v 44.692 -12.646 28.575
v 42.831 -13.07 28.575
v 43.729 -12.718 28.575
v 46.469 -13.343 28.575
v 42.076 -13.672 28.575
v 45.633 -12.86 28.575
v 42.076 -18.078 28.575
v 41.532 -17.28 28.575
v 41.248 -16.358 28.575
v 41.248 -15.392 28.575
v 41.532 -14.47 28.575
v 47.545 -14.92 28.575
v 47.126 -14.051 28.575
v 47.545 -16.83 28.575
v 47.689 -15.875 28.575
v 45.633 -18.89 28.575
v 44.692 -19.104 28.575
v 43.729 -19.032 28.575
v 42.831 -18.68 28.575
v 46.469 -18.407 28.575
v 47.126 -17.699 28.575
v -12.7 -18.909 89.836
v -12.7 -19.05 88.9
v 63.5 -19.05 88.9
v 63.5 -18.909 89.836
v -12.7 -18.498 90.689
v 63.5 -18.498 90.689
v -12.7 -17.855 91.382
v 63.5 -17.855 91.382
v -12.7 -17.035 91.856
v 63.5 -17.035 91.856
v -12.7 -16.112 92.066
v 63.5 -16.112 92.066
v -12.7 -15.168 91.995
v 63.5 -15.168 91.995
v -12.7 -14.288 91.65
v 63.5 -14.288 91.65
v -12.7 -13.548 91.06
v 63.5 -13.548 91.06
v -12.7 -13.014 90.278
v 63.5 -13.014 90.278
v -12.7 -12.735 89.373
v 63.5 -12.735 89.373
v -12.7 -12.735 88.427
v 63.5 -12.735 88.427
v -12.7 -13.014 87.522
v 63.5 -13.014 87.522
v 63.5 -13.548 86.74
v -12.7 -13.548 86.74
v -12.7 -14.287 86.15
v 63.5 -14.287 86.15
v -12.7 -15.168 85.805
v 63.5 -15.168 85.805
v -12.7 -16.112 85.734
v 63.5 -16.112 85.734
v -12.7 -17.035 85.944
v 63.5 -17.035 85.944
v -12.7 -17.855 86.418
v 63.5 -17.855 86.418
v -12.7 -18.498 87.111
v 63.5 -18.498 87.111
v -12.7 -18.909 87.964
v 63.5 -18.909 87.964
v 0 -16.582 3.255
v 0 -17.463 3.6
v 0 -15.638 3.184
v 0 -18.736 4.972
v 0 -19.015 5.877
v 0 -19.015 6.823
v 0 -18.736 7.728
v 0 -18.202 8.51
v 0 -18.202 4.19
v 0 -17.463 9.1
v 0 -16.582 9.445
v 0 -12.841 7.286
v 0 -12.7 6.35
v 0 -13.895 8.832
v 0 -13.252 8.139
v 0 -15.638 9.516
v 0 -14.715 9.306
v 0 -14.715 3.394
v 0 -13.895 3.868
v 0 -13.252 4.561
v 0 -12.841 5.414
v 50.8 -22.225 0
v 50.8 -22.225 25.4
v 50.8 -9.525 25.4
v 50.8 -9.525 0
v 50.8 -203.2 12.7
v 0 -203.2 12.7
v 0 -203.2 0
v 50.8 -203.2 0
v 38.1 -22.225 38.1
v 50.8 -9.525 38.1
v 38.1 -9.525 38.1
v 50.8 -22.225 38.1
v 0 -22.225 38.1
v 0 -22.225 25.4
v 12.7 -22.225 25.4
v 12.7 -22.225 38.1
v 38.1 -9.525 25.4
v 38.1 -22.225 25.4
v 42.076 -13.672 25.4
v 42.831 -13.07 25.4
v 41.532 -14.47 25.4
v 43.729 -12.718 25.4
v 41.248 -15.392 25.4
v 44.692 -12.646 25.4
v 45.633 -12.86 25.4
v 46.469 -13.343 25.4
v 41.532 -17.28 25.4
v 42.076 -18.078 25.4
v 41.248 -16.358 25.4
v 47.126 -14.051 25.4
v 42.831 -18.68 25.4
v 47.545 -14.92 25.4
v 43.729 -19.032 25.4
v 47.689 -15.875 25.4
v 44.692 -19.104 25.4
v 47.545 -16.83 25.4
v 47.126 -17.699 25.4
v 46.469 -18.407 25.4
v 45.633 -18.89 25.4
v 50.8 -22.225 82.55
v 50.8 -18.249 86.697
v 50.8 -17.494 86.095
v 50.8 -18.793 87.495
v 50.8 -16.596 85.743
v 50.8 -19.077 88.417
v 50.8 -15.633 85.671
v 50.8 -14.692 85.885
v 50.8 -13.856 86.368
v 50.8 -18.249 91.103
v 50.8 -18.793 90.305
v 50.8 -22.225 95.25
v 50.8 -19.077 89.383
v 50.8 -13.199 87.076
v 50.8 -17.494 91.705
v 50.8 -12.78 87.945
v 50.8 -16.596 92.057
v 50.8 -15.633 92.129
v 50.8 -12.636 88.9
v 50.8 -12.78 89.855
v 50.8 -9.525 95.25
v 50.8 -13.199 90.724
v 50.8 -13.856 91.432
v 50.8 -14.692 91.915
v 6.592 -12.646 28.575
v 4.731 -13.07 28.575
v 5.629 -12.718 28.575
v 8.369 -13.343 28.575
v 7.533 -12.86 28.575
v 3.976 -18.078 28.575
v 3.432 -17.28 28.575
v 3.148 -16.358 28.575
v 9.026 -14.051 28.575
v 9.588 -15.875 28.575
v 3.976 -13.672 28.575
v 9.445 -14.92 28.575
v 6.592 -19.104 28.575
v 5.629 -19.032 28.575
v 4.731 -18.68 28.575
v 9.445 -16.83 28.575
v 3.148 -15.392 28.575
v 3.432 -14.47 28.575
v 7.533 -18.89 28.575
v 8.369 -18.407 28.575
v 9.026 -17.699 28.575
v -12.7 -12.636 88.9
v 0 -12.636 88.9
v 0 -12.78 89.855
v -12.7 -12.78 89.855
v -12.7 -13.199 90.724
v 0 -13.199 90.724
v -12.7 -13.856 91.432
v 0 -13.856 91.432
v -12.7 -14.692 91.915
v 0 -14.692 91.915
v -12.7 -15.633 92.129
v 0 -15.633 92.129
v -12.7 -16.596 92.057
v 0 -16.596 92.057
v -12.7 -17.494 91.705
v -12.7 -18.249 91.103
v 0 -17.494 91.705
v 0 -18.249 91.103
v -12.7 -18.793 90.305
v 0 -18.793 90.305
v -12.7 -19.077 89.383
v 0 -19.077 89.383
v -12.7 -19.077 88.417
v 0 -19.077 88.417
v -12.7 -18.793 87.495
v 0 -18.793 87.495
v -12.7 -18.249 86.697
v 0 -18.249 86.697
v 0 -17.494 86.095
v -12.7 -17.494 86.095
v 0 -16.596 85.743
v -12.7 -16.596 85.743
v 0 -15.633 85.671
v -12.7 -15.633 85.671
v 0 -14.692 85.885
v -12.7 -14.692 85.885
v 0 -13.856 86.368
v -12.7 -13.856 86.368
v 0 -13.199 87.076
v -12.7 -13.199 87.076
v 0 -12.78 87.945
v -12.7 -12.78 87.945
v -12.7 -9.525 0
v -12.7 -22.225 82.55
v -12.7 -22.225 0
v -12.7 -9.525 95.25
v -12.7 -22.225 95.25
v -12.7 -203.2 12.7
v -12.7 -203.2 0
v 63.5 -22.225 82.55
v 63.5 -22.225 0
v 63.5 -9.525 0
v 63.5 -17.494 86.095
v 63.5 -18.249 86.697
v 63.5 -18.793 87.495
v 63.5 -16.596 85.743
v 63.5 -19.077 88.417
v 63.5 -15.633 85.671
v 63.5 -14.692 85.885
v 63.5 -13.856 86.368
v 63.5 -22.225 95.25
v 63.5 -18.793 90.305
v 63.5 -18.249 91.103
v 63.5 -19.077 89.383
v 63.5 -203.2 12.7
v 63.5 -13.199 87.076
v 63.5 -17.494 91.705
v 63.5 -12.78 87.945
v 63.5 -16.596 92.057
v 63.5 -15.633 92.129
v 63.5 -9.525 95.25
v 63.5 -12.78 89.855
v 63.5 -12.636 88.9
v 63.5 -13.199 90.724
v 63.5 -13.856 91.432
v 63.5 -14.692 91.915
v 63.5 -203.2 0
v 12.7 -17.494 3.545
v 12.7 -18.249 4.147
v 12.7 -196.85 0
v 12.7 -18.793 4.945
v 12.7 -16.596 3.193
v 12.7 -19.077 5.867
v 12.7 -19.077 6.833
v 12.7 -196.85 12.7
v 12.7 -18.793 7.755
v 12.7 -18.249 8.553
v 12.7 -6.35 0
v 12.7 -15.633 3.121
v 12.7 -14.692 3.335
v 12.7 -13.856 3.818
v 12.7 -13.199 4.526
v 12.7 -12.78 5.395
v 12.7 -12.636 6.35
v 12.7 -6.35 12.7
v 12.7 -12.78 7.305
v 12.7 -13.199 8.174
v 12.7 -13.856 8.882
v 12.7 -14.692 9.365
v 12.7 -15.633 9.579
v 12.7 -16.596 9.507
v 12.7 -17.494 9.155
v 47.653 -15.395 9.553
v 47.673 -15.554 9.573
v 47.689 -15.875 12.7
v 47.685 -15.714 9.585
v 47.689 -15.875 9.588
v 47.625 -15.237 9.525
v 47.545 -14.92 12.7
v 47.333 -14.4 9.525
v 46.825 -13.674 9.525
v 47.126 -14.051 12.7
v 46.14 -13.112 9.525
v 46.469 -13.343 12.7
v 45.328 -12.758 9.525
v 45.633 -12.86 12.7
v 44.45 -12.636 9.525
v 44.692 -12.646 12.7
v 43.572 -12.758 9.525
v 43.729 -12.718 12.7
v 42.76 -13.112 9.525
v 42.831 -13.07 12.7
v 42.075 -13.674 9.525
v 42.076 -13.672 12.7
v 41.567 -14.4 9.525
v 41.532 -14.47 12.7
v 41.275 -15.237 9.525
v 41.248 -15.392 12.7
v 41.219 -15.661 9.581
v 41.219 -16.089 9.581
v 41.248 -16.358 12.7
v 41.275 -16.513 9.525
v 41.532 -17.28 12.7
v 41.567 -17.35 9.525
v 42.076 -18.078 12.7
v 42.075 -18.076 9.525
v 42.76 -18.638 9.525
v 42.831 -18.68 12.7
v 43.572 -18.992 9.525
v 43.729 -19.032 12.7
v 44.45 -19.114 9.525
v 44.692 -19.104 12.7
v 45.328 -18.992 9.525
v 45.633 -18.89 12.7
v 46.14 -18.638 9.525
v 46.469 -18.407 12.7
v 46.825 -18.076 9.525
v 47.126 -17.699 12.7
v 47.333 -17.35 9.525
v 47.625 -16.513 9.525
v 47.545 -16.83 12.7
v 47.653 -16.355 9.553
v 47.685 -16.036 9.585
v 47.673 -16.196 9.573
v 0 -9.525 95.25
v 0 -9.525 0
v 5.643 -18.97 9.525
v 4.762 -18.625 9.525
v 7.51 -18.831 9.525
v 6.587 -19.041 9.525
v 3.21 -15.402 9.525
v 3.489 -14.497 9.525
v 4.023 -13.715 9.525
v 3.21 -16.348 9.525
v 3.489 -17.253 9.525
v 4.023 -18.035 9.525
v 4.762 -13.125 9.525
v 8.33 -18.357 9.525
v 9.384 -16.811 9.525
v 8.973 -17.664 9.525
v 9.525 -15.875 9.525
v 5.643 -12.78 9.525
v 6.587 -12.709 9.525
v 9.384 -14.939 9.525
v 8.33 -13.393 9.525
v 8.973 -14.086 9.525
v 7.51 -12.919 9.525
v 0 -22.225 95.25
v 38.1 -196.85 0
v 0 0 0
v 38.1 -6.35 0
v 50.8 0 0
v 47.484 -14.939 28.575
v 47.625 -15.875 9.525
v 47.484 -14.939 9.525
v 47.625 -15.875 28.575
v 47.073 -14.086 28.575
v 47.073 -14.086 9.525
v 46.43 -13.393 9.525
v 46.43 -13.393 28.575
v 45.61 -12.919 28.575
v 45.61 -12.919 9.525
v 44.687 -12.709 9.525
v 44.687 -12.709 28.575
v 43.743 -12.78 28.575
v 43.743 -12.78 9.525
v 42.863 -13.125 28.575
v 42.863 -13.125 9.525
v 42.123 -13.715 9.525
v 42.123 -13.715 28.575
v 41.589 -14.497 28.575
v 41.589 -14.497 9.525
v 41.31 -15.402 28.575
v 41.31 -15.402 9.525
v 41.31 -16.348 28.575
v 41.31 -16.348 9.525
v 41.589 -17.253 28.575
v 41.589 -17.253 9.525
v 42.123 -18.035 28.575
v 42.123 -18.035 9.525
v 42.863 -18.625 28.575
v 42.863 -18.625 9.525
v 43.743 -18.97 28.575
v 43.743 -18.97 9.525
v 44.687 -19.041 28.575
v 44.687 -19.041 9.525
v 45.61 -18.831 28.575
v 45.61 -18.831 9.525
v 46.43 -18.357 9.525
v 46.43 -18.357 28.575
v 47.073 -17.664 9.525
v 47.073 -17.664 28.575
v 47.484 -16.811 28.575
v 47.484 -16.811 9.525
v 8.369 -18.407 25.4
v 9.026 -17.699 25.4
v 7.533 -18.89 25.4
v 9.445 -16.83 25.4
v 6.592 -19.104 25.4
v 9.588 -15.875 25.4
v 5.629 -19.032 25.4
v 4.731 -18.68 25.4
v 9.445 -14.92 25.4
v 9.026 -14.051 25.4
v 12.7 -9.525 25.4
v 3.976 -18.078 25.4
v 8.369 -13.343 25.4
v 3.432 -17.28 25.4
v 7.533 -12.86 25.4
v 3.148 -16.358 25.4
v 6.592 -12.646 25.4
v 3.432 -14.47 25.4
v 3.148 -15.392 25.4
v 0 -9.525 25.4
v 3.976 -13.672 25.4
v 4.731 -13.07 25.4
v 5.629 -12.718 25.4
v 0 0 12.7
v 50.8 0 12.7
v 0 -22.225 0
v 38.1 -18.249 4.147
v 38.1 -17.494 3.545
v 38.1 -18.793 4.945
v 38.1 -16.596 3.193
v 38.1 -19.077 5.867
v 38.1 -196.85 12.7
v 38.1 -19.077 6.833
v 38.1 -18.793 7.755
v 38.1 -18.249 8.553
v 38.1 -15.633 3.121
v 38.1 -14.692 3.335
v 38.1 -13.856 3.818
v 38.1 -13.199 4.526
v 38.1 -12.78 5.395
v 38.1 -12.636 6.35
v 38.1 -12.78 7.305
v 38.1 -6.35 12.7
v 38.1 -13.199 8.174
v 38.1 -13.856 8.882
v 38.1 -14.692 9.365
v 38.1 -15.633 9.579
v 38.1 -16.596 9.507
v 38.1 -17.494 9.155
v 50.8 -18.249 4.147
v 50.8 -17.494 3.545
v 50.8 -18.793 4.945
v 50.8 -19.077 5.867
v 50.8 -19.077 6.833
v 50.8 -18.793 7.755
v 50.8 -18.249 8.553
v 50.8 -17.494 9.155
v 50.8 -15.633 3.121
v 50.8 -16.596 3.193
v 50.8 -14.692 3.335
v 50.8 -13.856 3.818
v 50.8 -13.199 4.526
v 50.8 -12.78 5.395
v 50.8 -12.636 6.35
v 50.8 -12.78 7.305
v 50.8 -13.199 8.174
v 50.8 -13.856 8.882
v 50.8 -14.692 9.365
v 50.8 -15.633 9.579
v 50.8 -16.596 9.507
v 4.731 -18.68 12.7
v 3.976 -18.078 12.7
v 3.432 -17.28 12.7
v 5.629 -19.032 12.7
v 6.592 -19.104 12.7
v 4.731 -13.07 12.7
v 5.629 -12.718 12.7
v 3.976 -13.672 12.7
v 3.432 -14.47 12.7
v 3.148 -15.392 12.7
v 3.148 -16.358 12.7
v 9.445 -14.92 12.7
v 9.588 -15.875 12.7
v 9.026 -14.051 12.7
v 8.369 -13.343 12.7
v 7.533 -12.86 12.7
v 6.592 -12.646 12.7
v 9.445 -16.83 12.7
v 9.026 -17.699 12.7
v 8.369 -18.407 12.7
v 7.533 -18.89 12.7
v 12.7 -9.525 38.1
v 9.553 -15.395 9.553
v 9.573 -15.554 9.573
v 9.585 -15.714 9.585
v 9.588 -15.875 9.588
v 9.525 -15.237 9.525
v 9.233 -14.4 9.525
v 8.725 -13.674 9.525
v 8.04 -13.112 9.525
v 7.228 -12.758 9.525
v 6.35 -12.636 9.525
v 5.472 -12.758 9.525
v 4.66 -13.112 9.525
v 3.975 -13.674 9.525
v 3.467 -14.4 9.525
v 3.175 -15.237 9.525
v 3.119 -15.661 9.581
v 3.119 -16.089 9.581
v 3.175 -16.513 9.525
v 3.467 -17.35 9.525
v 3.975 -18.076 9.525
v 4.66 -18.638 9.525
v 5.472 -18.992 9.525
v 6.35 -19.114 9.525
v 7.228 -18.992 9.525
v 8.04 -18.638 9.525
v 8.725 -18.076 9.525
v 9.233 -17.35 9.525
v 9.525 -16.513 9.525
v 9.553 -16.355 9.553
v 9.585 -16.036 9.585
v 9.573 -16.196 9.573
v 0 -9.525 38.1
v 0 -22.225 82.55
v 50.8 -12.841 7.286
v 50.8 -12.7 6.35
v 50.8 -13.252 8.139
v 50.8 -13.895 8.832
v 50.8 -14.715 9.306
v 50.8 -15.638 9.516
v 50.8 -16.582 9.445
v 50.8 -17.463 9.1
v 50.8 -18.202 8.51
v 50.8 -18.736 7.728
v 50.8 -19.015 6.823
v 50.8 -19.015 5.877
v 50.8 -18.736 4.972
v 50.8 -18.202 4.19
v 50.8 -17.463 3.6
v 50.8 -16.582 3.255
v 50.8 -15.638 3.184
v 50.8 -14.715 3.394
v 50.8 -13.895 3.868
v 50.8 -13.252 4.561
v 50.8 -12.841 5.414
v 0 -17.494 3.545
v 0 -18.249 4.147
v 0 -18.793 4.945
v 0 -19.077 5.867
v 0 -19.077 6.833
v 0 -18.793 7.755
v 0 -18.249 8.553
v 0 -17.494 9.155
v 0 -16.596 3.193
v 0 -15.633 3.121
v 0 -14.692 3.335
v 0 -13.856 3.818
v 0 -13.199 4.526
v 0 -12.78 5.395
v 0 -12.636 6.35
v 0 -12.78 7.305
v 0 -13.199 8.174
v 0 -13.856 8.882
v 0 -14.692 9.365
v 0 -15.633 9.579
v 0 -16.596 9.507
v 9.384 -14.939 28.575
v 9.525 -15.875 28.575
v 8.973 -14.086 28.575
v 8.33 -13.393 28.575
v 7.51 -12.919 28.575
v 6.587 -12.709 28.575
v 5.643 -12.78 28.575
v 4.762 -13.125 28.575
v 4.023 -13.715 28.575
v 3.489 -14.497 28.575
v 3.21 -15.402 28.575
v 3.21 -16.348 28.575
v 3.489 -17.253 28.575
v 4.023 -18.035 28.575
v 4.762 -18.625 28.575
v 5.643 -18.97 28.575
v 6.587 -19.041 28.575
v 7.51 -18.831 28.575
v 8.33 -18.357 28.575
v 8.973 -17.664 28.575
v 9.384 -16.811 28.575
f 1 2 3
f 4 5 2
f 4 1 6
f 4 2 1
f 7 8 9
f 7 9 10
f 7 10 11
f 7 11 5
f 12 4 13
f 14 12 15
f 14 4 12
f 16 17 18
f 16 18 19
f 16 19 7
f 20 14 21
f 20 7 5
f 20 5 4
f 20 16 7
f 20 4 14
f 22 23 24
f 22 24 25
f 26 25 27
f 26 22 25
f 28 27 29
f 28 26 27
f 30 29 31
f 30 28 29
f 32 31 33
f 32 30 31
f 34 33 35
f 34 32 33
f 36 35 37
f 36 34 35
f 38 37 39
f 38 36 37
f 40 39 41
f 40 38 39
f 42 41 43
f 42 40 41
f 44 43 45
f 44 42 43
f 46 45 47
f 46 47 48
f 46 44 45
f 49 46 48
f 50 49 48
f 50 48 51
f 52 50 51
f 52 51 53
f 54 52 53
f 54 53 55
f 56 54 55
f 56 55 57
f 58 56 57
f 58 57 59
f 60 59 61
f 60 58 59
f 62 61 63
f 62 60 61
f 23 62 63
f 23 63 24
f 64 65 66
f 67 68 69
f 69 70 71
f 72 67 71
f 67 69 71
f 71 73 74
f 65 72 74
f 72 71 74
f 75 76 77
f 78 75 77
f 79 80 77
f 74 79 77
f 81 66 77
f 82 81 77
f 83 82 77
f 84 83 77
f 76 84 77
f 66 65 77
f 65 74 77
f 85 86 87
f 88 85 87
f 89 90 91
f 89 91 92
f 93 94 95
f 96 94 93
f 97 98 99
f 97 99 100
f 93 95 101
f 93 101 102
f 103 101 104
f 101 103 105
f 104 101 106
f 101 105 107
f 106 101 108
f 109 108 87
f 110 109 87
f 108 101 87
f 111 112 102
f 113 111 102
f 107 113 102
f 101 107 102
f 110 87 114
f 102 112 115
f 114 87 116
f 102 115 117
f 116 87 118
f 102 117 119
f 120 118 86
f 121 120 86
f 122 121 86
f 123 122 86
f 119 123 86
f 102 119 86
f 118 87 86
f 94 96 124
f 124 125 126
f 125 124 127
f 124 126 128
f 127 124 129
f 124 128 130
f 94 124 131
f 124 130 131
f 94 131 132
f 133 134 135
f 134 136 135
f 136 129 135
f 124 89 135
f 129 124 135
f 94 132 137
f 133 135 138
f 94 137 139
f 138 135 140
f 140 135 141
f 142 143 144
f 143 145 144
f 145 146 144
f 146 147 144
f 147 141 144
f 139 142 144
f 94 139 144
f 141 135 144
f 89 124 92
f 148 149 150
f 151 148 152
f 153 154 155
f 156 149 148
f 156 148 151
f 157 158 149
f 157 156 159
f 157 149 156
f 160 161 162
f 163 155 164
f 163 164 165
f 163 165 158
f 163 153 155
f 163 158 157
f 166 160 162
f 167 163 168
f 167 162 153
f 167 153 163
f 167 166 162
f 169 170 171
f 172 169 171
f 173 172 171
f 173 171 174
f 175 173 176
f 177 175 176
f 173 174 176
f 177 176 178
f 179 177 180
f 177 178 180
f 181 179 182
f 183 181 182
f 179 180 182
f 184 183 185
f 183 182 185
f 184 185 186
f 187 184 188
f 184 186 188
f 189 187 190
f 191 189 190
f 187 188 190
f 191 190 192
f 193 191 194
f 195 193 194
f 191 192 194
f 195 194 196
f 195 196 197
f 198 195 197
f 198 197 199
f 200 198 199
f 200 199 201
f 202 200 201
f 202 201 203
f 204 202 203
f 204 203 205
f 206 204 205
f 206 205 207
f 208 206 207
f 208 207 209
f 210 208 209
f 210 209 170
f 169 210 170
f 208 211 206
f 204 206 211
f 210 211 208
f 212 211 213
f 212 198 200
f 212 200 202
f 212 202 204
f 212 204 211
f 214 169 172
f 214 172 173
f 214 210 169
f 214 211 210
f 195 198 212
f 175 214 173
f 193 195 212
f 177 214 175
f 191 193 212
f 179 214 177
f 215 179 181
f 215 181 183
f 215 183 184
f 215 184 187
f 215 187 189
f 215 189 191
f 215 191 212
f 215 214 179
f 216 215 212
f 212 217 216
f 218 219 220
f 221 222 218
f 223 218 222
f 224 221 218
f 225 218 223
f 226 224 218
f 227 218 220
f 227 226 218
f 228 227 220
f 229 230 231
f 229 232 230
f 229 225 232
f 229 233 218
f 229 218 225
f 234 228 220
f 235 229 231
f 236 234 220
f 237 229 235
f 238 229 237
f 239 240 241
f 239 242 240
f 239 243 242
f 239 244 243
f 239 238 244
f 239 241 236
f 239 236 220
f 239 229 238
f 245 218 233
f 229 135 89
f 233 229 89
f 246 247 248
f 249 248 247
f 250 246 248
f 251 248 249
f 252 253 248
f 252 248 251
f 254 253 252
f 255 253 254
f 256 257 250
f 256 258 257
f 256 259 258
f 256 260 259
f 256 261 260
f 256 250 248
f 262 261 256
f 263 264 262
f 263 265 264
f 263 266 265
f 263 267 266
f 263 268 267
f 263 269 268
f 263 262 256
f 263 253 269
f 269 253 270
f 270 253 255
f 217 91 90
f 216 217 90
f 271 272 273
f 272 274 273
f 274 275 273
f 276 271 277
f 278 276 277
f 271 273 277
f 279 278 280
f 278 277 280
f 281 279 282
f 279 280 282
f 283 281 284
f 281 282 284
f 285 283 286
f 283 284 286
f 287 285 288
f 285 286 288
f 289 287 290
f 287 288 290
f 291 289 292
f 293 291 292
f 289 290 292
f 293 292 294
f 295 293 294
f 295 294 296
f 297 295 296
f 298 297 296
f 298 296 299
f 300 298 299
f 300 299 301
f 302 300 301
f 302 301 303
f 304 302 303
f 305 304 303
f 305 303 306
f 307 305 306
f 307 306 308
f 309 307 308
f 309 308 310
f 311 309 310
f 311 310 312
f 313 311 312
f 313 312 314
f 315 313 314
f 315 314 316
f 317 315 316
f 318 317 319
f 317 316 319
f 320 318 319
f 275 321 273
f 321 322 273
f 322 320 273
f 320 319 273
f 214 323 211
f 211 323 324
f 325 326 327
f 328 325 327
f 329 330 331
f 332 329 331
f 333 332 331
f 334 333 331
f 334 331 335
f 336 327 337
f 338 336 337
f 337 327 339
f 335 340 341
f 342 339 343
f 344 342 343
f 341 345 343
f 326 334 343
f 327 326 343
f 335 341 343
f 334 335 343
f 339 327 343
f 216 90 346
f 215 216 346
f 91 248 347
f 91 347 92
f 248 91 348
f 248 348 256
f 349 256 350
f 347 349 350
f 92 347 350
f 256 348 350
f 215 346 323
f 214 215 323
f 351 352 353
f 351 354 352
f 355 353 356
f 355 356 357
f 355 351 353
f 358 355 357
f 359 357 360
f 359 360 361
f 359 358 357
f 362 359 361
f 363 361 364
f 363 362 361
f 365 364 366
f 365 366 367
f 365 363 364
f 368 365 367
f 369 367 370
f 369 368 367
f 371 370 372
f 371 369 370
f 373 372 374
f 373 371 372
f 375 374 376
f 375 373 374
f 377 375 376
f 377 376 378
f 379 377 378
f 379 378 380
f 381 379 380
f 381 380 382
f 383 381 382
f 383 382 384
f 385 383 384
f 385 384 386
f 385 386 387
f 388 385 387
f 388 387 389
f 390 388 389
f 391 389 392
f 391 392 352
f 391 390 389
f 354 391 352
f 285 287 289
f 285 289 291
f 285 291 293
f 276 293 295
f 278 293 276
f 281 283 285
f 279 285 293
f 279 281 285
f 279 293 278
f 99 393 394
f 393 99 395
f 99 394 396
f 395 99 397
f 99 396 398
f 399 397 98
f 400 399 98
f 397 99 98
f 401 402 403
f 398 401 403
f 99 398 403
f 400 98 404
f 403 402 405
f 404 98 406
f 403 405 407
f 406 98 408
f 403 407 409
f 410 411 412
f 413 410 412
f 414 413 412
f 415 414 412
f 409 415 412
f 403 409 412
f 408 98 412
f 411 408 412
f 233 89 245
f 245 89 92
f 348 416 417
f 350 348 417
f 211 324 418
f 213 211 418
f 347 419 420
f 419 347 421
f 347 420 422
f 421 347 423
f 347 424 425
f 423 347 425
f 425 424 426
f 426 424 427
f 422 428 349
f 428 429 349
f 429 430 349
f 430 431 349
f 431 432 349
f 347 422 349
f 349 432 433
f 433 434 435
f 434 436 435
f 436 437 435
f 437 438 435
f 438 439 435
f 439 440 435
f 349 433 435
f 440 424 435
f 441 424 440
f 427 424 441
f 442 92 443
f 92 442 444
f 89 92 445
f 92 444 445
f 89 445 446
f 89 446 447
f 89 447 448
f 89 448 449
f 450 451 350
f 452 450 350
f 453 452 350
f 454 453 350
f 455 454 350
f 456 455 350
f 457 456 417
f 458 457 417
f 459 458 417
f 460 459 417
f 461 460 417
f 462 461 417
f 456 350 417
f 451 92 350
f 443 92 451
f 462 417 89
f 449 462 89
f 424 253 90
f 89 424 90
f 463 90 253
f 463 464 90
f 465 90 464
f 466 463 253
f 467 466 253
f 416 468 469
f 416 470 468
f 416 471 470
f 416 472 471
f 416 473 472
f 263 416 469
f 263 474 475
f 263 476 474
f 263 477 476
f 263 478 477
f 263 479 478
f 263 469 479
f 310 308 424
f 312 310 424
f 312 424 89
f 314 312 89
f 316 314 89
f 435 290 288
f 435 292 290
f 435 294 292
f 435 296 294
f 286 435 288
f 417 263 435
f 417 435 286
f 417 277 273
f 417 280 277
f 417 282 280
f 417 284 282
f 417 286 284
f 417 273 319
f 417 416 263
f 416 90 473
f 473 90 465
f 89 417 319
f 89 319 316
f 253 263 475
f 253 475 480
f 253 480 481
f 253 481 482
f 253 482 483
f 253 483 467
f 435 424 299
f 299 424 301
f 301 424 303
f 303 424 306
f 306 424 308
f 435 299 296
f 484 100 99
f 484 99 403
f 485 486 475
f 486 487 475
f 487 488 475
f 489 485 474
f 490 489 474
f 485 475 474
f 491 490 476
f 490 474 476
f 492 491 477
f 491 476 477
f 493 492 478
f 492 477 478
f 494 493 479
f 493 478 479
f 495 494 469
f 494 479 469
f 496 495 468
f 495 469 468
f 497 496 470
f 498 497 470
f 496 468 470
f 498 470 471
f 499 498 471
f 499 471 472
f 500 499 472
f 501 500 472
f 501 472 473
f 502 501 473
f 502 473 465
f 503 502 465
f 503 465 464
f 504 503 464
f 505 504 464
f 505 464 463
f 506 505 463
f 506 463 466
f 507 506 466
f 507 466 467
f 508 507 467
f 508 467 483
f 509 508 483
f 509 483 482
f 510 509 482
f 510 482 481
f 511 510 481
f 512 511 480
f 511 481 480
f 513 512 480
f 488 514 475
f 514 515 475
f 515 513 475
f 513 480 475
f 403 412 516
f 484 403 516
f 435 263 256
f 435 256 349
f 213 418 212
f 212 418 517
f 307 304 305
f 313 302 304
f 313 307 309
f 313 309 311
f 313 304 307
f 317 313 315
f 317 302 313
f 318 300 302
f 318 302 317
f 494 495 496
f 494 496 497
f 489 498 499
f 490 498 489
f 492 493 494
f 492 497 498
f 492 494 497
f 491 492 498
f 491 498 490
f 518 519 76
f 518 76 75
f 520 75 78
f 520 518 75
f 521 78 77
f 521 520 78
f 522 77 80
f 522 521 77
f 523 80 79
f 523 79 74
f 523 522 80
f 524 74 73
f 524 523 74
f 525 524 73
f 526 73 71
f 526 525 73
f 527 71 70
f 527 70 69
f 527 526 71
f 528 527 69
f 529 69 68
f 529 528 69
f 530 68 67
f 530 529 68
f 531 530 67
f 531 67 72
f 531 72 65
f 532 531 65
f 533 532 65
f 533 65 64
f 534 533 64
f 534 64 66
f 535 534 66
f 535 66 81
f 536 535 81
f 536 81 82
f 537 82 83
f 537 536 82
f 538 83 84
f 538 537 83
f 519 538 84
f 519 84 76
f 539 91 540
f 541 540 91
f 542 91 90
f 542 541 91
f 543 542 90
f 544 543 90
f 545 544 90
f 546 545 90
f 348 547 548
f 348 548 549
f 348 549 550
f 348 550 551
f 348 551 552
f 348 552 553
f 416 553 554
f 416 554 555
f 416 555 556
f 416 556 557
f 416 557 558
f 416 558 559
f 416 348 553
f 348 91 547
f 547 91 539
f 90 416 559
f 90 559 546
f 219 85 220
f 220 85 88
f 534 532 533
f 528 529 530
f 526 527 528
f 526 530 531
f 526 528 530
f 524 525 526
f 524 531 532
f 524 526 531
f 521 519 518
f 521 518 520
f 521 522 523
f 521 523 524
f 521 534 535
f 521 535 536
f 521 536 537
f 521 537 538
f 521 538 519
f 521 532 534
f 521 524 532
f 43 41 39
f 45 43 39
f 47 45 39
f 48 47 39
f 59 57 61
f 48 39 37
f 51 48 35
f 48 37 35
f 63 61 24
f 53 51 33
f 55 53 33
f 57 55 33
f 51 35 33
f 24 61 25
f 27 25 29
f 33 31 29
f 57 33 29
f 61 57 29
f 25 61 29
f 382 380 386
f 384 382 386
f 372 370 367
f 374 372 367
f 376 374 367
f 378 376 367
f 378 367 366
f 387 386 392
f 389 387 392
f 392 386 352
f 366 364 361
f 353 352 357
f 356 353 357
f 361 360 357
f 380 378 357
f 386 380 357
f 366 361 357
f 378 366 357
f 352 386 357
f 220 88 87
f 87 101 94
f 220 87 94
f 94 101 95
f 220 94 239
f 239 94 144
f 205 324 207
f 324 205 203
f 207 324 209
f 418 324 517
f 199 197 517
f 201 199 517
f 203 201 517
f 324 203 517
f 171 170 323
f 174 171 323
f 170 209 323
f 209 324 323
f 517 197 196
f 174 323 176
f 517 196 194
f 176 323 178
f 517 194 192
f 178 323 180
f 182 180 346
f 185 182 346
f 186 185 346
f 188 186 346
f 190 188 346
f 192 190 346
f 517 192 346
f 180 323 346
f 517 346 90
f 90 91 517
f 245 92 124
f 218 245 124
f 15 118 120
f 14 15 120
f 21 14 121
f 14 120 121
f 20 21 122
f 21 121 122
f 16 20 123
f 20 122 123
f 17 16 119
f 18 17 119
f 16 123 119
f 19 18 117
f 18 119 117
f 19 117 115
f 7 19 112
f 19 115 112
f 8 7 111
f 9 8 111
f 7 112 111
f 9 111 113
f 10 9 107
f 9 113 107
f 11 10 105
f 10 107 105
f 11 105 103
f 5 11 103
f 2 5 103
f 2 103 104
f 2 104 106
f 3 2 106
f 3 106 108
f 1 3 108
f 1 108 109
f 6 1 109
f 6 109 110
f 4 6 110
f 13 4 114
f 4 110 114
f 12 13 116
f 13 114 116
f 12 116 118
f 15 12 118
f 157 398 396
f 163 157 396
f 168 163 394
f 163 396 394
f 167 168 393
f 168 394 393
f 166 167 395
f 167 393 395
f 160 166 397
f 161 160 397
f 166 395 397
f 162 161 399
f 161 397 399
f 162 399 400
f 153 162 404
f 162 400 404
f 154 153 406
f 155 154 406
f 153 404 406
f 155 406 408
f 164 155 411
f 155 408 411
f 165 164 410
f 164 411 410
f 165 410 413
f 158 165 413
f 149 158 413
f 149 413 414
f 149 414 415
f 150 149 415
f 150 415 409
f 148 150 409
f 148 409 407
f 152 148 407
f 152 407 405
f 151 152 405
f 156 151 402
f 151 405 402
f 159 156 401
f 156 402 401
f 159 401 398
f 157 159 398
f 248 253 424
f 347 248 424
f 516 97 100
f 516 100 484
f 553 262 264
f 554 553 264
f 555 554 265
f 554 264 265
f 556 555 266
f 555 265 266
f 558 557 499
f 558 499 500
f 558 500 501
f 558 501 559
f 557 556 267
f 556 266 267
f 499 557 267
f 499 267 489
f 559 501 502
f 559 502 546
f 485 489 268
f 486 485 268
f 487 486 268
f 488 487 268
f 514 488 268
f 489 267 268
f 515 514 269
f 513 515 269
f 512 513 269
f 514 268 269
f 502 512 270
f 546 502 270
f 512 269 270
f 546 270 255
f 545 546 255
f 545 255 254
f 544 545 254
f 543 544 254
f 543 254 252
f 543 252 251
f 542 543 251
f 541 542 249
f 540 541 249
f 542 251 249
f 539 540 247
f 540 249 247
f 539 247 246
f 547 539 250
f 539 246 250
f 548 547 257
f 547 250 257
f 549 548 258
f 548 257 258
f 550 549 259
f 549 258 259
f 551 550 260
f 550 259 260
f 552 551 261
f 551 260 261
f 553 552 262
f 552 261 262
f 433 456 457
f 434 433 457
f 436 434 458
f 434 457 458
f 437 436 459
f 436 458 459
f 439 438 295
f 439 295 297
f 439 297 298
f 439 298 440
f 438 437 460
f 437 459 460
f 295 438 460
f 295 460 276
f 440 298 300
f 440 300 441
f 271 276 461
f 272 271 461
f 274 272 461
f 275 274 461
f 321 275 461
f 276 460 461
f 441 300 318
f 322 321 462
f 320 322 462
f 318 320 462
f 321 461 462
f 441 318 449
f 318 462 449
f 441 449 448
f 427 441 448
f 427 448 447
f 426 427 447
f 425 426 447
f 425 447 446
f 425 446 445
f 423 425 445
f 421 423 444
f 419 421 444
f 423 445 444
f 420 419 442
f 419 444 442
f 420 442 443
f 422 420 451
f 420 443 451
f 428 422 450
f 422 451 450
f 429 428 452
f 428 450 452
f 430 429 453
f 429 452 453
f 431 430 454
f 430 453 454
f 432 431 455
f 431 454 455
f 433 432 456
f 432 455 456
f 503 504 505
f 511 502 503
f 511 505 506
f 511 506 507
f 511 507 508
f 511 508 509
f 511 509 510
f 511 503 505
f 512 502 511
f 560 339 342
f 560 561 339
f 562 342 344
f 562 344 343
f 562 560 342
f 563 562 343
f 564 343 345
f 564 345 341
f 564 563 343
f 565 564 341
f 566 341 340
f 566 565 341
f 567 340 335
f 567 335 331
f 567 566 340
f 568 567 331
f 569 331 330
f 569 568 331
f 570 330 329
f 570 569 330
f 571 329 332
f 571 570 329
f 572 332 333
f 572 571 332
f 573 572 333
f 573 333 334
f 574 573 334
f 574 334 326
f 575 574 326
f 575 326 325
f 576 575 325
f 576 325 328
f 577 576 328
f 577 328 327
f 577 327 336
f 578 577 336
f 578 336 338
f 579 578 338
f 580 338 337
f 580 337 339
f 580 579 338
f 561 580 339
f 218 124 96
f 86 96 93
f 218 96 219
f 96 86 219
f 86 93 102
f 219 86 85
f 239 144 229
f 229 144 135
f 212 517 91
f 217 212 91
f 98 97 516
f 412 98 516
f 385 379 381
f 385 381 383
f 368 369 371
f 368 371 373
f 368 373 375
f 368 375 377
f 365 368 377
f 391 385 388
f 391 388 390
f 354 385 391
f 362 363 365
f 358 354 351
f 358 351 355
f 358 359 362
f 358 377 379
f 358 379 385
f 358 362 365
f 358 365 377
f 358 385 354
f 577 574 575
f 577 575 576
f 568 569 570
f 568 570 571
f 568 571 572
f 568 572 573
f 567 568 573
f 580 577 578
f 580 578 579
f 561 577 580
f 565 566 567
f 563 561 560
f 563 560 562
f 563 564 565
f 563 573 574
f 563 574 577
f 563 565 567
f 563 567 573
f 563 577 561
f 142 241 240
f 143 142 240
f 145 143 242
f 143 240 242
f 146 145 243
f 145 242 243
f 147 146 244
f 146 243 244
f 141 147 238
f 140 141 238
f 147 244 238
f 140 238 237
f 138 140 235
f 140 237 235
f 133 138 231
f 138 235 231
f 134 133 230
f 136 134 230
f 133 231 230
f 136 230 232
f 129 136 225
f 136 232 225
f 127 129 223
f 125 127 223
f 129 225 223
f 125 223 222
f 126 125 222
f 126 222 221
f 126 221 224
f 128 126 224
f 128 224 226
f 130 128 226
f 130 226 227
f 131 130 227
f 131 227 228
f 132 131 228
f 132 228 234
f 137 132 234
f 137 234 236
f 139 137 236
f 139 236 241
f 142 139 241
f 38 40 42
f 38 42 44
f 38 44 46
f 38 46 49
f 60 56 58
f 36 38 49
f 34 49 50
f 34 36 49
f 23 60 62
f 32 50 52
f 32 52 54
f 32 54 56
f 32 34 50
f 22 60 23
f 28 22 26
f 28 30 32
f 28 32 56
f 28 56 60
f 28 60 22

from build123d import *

# Parameters (mm, degrees)
F0_W           = 50.8
F0_H           = 12.7
F1_DEPTH       = 203.2
F2_W           = 25.4
F2_H           = 190.5
F3_DEPTH       = 12.701
F4_R           = 3.2385
F5_DEPTH       = 50.801
F6_R           = 3.175
F7_DEPTH       = 50.8
F9_DEPTH       = 12.7
F11_DEPTH      = 12.7
F12_R          = 3.2385
F13_DEPTH      = 76.201
F14_R          = 3.2385
F15_DEPTH      = 76.201
F16_R          = 3.175
F17_DEPTH      = 76.2
F18_R          = 3.2385
F19_DEPTH      = 3.175
F20_R          = 3.175
F21_DEPTH      = 15.875
F21_DEPTH_BACK = 3.175
F22_W          = 12.7
F22_H          = 12.7
F23_DEPTH      = 12.7
F24_R          = 3.2385
F25_DEPTH      = 3.175
F26_W          = 12.7
F26_H          = 12.7
F27_DEPTH      = 12.7
F28_R          = 3.2385
F29_DEPTH      = 3.175


with BuildPart() as f1:
    # F0 (on Front) → F1 (new body)
    with BuildSketch(Plane.XZ):
        with Locations((25.4, 6.35)):
            Rectangle(F0_W, F0_H)
    extrude(amount=F1_DEPTH)

    # F2 (on face) → F3 (cut, through all)
    with BuildSketch(Plane.XY.offset(12.7)):
        with Locations((25.4, -101.6)):
            Rectangle(F2_W, F2_H)
    extrude(amount=-F3_DEPTH, mode=Mode.SUBTRACT)

    # F4 (on face) → F5 (cut, through all)
    with BuildSketch(Plane.YZ.offset(50.8)):
        with Locations((-15.875, 6.35)):
            Circle(F4_R)
    extrude(amount=-F5_DEPTH, mode=Mode.SUBTRACT)

    # F14 (on face) → F15 (cut, through all)
    with BuildSketch(Plane(origin=(-12.7, 0, 0), x_dir=(0, -1, 0), z_dir=(-1, 0, 0))):
        with Locations((15.875, 88.9)):
            Circle(F14_R)
    extrude(amount=-F15_DEPTH, mode=Mode.SUBTRACT)

    # F18 (on face) → F19 (cut)
    with BuildSketch(Plane.XY.offset(12.7)):
        with Locations((6.35, -15.875)):
            Circle(F18_R)
        with Locations((44.45, -15.875)):
            Circle(F18_R)
    extrude(amount=-F19_DEPTH, mode=Mode.SUBTRACT)


with BuildPart() as f7:
    # F6 (on face) → F7 (new body)
    with BuildSketch(Plane.YZ.offset(50.8)):
        with Locations((-15.875, 6.35)):
            Circle(F6_R)
    extrude(amount=-F7_DEPTH)


with BuildPart() as f9:
    # F8 (on face) → F9 (new body)
    with BuildSketch(Plane.YZ.offset(50.8)):
        Polygon((-22.225, 0), (-9.525, 0), (-9.525, 95.25), (-22.225, 95.25), (-22.225, 82.55), align=None)
        Polygon((-203.2, 0), (-22.225, 82.55), (-22.225, 95.25), (-203.2, 12.7), align=None)
    extrude(amount=F9_DEPTH)


with BuildPart() as f11:
    # F10 (on face) → F11 (new body)
    with BuildSketch(Plane(origin=(0, 0, 0), x_dir=(0, -1, 0), z_dir=(-1, 0, 0))):
        Polygon((9.525, 95.25), (9.525, 0), (22.225, 0), (22.225, 82.55), (22.225, 95.25), align=None)
        Polygon((22.225, 95.25), (22.225, 82.55), (203.2, 0), (203.2, 12.7), align=None)
    extrude(amount=F11_DEPTH)


with BuildPart() as f13_tool:
    # F12 (on face) → F13 (new body, through all)
    with BuildSketch(Plane.YZ.offset(63.5)):
        with Locations((-15.875, 88.9)):
            Circle(F12_R)
    extrude(amount=-F13_DEPTH)


with BuildPart() as f9_1:
    add(f9.part)

    # F13: cut by f13_tool
    add(f13_tool.part, mode=Mode.SUBTRACT)

    # F26 (on face) → F27 (join)
    with BuildSketch(Plane(origin=(50.8, 0, 0), x_dir=(0, -1, 0), z_dir=(-1, 0, 0))):
        with Locations((15.875, 31.75)):
            Rectangle(F26_W, F26_H)
    extrude(amount=F27_DEPTH)

    # F28 (on face) → F29 (cut)
    with BuildSketch(Plane(origin=(0, 0, 25.4), x_dir=(1, 0, 0), z_dir=(0, 0, -1))):
        with Locations((44.45, 15.875)):
            Circle(F28_R)
    extrude(amount=-F29_DEPTH, mode=Mode.SUBTRACT)


with BuildPart() as f11_1:
    add(f11.part)

    # F13: cut by f13_tool
    add(f13_tool.part, mode=Mode.SUBTRACT)


with BuildPart() as f17:
    # F16 (on face) → F17 (new body)
    with BuildSketch(Plane(origin=(-12.7, 0, 0), x_dir=(0, -1, 0), z_dir=(-1, 0, 0))):
        with Locations((15.875, 88.9)):
            Circle(F16_R)
    extrude(amount=-F17_DEPTH)


with BuildPart() as f21:
    # F20 (on face) → F21 (new body, two sides)
    with BuildSketch(Plane.XY.offset(12.7)) as f21_sk:
        with Locations((6.35, -15.875)):
            Circle(F20_R)
    extrude(amount=F21_DEPTH)
    extrude(f21_sk.sketch, amount=-F21_DEPTH_BACK)


with BuildPart() as f21b:
    # F20 (on face) → F21, piece 2 (new body, two sides)
    with BuildSketch(Plane.XY.offset(12.7)) as f21_2_sk:
        with Locations((44.45, -15.875)):
            Circle(F20_R)
    extrude(amount=F21_DEPTH)
    extrude(f21_2_sk.sketch, amount=-F21_DEPTH_BACK)


with BuildPart() as f23:
    # F22 (on face) → F23 (new body)
    with BuildSketch(Plane.YZ):
        with Locations((-15.875, 31.75)):
            Rectangle(F22_W, F22_H)
    extrude(amount=F23_DEPTH)

    # F24 (on face) → F25 (cut)
    with BuildSketch(Plane(origin=(0, 0, 25.4), x_dir=(1, 0, 0), z_dir=(0, 0, -1))):
        with Locations((6.35, 15.875)):
            Circle(F24_R)
    extrude(amount=-F25_DEPTH, mode=Mode.SUBTRACT)


solid = Compound([f1.part, f7.part, f9_1.part, f11_1.part, f17.part, f21.part, f21b.part, f23.part])
